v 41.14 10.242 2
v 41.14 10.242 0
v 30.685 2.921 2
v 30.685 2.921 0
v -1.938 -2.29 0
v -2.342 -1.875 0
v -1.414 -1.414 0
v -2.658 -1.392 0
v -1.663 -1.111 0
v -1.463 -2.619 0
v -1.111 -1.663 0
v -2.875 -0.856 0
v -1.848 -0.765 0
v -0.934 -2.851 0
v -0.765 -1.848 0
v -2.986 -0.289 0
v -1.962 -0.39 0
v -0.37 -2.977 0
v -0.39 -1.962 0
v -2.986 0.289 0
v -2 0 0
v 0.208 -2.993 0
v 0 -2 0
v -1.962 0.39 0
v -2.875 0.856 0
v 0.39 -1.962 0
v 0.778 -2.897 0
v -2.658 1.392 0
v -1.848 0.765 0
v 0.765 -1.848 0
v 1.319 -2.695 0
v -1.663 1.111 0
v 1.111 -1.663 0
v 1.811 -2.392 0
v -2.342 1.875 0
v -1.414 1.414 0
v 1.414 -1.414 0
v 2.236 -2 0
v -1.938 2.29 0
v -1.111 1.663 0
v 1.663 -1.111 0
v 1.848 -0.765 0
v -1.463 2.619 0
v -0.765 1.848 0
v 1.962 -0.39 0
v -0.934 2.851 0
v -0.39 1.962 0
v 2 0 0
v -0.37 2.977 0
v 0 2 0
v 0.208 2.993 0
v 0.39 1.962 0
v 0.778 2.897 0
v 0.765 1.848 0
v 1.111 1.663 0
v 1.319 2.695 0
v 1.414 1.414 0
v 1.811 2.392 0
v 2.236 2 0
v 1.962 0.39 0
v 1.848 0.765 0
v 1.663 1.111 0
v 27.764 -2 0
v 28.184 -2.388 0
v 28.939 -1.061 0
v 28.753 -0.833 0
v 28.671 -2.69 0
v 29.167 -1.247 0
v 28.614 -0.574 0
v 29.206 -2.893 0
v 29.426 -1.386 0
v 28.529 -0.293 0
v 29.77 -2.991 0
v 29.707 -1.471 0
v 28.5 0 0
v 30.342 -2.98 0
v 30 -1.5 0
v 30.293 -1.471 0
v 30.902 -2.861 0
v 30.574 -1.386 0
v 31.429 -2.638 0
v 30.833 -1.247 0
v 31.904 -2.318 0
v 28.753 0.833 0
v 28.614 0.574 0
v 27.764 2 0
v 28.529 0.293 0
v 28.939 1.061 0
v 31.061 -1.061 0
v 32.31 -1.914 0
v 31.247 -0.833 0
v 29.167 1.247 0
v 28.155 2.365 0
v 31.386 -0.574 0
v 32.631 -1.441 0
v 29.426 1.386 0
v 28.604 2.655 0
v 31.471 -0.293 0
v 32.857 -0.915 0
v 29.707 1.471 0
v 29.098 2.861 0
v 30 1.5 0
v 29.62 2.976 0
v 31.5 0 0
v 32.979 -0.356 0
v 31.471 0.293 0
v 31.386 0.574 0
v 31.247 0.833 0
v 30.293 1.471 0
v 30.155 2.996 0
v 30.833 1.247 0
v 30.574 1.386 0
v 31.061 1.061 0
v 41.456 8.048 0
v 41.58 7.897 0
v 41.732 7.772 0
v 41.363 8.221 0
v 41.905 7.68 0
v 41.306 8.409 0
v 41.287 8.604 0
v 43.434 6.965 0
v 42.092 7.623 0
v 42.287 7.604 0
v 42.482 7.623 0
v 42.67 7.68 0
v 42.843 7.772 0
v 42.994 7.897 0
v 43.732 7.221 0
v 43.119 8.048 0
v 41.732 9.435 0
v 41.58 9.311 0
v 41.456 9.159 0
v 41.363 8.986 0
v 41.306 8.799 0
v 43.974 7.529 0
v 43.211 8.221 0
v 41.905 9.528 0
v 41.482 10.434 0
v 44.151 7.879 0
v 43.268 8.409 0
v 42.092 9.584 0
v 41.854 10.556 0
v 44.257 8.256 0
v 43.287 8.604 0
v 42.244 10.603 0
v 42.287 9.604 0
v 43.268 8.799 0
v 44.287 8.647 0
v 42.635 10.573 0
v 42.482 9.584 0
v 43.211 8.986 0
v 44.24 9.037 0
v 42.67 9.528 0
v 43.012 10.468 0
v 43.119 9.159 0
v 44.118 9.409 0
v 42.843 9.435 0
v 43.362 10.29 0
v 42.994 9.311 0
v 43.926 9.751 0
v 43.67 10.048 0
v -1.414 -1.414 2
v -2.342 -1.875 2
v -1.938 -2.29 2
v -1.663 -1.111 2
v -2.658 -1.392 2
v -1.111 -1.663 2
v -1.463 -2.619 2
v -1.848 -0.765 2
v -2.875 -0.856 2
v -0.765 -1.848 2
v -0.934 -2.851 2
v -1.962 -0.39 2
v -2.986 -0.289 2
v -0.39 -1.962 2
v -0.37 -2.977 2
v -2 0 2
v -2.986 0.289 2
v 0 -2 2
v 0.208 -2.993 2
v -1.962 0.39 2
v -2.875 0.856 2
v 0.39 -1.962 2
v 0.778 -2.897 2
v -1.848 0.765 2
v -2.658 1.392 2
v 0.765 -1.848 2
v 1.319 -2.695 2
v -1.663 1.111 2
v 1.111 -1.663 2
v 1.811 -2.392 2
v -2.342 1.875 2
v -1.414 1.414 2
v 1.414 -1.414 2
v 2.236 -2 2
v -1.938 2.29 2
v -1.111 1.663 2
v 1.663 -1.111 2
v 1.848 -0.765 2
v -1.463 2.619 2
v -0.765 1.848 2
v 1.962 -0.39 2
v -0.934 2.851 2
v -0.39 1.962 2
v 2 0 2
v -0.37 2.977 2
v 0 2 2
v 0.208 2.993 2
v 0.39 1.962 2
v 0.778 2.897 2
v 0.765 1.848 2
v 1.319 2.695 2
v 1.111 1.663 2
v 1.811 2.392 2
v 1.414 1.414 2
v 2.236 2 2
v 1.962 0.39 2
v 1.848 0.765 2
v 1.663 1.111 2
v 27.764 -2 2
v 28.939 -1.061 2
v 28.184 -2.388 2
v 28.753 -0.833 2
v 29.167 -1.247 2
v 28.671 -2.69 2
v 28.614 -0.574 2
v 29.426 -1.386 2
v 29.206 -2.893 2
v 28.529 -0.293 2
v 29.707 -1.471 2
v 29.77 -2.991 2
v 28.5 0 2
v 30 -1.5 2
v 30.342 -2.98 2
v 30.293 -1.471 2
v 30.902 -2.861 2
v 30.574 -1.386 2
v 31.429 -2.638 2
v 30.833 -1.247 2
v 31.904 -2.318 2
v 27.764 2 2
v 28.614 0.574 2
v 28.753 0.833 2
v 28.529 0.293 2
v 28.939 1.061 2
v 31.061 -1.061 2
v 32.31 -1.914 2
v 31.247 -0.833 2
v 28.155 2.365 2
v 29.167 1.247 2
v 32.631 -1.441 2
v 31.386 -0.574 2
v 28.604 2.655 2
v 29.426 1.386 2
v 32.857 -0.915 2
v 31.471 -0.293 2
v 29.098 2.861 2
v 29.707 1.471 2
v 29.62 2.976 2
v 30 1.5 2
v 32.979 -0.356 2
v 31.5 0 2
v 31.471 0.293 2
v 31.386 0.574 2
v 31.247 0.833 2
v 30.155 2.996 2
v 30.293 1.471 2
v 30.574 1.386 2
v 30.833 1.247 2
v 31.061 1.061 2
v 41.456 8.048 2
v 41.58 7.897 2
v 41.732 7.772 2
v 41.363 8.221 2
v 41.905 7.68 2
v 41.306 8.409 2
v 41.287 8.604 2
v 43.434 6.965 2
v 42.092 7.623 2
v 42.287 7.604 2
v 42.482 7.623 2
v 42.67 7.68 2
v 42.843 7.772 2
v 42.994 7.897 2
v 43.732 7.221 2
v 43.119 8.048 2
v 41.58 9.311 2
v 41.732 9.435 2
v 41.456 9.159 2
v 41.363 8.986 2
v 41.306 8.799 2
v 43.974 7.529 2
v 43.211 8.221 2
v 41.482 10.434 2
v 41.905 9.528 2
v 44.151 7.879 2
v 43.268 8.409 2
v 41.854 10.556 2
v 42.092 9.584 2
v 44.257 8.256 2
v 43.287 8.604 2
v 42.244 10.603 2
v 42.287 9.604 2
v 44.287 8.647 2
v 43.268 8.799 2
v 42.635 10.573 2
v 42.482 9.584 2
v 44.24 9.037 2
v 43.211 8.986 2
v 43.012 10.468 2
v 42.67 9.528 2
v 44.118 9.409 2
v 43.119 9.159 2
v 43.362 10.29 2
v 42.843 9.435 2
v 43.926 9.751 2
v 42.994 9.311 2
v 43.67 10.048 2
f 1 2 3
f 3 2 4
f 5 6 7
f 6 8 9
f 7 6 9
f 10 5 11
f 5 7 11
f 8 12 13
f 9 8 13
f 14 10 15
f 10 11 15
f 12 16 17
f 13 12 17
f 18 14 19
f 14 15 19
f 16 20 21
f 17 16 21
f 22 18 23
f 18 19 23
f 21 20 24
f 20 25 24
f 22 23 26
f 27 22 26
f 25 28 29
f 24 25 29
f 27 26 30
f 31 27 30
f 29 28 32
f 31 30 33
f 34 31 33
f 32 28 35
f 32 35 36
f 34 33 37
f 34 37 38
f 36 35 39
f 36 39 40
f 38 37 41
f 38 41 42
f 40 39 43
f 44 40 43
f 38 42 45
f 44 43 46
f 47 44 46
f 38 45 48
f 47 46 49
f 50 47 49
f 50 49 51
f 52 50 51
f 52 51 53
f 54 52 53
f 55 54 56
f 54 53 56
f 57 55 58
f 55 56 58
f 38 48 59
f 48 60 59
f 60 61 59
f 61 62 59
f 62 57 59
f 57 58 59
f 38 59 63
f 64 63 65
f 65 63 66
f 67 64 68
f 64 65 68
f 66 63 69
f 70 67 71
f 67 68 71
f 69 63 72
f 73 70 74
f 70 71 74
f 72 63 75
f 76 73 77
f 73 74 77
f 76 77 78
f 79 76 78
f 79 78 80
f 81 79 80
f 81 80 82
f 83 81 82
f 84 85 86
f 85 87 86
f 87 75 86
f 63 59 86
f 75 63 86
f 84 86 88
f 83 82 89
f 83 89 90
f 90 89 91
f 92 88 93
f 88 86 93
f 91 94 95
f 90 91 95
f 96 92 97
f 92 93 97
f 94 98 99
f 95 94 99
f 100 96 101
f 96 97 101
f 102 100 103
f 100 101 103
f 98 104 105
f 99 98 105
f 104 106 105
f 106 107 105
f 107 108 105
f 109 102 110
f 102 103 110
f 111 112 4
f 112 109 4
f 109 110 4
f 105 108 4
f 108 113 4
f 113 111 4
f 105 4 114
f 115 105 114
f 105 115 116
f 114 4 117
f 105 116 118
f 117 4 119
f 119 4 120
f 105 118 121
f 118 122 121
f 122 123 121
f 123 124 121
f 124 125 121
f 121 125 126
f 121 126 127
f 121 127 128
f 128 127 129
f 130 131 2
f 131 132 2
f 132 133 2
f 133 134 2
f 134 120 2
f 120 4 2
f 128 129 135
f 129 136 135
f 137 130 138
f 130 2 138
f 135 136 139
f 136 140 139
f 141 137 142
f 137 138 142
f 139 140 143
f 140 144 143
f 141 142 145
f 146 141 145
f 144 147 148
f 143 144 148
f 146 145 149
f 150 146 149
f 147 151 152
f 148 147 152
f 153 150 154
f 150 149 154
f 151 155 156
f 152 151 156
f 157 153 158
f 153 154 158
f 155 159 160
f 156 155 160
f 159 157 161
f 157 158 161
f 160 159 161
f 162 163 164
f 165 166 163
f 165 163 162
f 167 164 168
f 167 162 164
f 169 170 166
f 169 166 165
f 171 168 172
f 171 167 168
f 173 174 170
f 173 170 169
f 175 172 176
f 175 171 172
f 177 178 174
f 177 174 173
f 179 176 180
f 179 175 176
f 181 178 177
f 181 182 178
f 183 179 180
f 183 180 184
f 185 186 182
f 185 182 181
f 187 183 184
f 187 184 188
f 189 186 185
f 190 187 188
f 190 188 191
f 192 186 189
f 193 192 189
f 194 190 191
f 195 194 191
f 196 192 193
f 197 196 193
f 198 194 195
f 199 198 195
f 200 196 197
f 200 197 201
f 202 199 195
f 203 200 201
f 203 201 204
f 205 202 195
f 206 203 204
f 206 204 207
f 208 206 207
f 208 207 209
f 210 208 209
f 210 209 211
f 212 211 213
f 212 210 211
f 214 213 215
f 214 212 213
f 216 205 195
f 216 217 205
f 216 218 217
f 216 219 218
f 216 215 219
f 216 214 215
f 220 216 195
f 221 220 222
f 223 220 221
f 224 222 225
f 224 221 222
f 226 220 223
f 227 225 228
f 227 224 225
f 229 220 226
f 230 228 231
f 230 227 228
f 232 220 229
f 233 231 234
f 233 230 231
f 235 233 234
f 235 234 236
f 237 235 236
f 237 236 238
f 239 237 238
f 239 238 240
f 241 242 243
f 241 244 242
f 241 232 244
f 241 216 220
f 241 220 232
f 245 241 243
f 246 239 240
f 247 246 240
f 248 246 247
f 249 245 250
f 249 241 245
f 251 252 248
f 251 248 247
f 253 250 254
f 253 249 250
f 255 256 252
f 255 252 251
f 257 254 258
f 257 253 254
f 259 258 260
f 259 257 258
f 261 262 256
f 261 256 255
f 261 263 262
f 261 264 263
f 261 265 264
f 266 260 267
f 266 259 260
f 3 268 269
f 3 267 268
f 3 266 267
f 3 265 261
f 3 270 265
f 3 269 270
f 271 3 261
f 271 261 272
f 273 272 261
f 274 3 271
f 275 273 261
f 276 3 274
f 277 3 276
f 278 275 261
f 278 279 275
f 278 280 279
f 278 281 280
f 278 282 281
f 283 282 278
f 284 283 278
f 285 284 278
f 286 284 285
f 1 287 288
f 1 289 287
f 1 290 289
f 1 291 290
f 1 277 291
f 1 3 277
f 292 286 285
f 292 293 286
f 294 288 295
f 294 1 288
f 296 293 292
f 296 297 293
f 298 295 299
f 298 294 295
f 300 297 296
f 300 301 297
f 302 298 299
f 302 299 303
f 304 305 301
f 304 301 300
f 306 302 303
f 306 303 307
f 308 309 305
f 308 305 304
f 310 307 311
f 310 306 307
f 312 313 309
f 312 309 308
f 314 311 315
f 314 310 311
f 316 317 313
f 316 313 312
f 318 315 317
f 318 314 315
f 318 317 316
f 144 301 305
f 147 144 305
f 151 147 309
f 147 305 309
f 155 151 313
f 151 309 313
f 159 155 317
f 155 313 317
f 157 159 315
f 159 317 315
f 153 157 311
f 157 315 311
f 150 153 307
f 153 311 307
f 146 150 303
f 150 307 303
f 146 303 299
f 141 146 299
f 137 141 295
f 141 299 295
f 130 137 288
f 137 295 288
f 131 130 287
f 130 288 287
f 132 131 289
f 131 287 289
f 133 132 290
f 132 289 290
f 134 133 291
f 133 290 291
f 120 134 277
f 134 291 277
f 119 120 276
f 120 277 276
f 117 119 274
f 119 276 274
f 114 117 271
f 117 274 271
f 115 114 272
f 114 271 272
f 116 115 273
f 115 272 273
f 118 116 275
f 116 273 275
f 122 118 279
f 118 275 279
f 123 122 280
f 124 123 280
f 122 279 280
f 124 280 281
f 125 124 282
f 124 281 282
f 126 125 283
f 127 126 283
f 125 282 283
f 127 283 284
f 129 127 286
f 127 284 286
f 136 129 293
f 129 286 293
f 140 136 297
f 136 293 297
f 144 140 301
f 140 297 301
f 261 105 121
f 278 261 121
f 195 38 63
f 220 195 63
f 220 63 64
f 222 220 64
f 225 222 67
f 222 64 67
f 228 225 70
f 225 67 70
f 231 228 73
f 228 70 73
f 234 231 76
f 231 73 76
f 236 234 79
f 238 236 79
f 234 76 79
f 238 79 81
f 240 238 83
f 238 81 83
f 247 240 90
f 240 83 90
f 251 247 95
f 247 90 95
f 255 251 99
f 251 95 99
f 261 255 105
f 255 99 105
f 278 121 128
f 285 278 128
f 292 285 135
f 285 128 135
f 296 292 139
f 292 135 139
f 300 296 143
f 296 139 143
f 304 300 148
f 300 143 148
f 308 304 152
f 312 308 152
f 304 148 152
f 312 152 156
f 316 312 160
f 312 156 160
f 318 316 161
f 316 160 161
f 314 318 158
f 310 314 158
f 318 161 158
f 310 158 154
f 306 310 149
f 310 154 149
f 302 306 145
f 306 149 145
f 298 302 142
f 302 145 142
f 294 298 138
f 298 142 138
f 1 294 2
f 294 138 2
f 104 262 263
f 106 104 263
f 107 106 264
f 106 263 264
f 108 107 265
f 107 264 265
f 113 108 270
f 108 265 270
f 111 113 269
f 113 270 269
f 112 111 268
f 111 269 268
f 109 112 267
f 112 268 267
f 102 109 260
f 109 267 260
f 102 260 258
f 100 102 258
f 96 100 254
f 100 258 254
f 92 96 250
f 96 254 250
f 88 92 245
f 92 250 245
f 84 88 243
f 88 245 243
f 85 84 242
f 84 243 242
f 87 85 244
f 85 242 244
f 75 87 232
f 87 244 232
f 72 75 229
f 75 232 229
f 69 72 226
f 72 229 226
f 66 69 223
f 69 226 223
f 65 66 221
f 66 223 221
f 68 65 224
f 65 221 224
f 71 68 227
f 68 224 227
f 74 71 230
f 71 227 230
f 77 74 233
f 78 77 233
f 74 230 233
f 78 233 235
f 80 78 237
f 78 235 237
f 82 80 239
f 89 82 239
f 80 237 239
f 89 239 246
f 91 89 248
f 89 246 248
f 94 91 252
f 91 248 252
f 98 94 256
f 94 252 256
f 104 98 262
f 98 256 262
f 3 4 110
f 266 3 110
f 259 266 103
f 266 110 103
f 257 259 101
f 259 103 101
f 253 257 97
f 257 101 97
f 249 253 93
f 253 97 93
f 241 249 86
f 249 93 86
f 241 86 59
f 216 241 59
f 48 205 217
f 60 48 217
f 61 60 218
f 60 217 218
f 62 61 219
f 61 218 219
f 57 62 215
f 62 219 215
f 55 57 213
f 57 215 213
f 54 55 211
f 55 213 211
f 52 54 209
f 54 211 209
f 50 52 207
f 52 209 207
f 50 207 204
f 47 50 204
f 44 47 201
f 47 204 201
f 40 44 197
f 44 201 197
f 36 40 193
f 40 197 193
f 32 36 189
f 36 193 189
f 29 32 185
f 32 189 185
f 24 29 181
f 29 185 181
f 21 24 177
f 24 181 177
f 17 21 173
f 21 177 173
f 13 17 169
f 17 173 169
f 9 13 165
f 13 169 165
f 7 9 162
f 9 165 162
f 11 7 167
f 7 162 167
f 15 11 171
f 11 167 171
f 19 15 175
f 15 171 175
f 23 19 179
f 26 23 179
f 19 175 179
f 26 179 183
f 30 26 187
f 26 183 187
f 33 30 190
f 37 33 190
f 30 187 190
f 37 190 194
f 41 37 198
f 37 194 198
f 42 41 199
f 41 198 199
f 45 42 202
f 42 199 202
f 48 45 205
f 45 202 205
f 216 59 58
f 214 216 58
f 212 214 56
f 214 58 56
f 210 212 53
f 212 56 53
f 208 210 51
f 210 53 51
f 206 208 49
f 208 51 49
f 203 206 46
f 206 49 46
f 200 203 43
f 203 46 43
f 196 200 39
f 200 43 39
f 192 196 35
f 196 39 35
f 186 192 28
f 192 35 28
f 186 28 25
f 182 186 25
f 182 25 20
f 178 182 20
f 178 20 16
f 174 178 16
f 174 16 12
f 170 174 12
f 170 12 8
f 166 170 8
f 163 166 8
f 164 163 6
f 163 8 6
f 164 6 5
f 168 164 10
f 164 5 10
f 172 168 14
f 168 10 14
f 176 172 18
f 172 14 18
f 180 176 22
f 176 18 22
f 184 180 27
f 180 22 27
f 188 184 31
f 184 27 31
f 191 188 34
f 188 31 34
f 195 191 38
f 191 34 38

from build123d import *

# Parameters (mm, degrees)
EXTRUDE_1_DEPTH     = 2
SKETCH_2_R          = 2
SKETCH_2_R_2        = 1.5
SKETCH_2_R_3        = 1
CUT_EXTRUDE_1_DEPTH = 2


with BuildPart() as part:
    # 草图1 → 凸台-拉伸1 (new body)
    with BuildSketch(Plane.XY):
        with BuildLine():
            Line((41.140127792, 10.241950634), (30.684526782, 2.920859991))
            ThreePointArc((30.684526782, 2.920859991), (29.097882601, 2.861150852), (27.763932023, 2))
            Line((27.763932023, 2), (2.236067977, 2))
            ThreePointArc((2.236067977, 2), (-3, 0), (2.236067977, -2))
            Line((2.236067977, -2), (27.763932023, -2))
            ThreePointArc((27.763932023, -2), (30.902117399, -2.861150852), (32.978832528, -0.355748187))
            Line((32.978832528, -0.355748187), (43.434433537, 6.965342457))
            ThreePointArc((43.434433537, 6.965342457), (43.925584753, 9.750799418), (41.140127792, 10.241950634))
        make_face()
    extrude(amount=EXTRUDE_1_DEPTH)

    # 草图2 → 切除-拉伸1 (cut)
    with BuildSketch(Plane.XY.offset(2)):
        Circle(SKETCH_2_R)
        with Locations((30, 0)):
            Circle(SKETCH_2_R_2)
        with Locations((42.287280664, 8.603646545)):
            Circle(SKETCH_2_R_3)
    extrude(amount=-CUT_EXTRUDE_1_DEPTH, mode=Mode.SUBTRACT)


solid = part.part
